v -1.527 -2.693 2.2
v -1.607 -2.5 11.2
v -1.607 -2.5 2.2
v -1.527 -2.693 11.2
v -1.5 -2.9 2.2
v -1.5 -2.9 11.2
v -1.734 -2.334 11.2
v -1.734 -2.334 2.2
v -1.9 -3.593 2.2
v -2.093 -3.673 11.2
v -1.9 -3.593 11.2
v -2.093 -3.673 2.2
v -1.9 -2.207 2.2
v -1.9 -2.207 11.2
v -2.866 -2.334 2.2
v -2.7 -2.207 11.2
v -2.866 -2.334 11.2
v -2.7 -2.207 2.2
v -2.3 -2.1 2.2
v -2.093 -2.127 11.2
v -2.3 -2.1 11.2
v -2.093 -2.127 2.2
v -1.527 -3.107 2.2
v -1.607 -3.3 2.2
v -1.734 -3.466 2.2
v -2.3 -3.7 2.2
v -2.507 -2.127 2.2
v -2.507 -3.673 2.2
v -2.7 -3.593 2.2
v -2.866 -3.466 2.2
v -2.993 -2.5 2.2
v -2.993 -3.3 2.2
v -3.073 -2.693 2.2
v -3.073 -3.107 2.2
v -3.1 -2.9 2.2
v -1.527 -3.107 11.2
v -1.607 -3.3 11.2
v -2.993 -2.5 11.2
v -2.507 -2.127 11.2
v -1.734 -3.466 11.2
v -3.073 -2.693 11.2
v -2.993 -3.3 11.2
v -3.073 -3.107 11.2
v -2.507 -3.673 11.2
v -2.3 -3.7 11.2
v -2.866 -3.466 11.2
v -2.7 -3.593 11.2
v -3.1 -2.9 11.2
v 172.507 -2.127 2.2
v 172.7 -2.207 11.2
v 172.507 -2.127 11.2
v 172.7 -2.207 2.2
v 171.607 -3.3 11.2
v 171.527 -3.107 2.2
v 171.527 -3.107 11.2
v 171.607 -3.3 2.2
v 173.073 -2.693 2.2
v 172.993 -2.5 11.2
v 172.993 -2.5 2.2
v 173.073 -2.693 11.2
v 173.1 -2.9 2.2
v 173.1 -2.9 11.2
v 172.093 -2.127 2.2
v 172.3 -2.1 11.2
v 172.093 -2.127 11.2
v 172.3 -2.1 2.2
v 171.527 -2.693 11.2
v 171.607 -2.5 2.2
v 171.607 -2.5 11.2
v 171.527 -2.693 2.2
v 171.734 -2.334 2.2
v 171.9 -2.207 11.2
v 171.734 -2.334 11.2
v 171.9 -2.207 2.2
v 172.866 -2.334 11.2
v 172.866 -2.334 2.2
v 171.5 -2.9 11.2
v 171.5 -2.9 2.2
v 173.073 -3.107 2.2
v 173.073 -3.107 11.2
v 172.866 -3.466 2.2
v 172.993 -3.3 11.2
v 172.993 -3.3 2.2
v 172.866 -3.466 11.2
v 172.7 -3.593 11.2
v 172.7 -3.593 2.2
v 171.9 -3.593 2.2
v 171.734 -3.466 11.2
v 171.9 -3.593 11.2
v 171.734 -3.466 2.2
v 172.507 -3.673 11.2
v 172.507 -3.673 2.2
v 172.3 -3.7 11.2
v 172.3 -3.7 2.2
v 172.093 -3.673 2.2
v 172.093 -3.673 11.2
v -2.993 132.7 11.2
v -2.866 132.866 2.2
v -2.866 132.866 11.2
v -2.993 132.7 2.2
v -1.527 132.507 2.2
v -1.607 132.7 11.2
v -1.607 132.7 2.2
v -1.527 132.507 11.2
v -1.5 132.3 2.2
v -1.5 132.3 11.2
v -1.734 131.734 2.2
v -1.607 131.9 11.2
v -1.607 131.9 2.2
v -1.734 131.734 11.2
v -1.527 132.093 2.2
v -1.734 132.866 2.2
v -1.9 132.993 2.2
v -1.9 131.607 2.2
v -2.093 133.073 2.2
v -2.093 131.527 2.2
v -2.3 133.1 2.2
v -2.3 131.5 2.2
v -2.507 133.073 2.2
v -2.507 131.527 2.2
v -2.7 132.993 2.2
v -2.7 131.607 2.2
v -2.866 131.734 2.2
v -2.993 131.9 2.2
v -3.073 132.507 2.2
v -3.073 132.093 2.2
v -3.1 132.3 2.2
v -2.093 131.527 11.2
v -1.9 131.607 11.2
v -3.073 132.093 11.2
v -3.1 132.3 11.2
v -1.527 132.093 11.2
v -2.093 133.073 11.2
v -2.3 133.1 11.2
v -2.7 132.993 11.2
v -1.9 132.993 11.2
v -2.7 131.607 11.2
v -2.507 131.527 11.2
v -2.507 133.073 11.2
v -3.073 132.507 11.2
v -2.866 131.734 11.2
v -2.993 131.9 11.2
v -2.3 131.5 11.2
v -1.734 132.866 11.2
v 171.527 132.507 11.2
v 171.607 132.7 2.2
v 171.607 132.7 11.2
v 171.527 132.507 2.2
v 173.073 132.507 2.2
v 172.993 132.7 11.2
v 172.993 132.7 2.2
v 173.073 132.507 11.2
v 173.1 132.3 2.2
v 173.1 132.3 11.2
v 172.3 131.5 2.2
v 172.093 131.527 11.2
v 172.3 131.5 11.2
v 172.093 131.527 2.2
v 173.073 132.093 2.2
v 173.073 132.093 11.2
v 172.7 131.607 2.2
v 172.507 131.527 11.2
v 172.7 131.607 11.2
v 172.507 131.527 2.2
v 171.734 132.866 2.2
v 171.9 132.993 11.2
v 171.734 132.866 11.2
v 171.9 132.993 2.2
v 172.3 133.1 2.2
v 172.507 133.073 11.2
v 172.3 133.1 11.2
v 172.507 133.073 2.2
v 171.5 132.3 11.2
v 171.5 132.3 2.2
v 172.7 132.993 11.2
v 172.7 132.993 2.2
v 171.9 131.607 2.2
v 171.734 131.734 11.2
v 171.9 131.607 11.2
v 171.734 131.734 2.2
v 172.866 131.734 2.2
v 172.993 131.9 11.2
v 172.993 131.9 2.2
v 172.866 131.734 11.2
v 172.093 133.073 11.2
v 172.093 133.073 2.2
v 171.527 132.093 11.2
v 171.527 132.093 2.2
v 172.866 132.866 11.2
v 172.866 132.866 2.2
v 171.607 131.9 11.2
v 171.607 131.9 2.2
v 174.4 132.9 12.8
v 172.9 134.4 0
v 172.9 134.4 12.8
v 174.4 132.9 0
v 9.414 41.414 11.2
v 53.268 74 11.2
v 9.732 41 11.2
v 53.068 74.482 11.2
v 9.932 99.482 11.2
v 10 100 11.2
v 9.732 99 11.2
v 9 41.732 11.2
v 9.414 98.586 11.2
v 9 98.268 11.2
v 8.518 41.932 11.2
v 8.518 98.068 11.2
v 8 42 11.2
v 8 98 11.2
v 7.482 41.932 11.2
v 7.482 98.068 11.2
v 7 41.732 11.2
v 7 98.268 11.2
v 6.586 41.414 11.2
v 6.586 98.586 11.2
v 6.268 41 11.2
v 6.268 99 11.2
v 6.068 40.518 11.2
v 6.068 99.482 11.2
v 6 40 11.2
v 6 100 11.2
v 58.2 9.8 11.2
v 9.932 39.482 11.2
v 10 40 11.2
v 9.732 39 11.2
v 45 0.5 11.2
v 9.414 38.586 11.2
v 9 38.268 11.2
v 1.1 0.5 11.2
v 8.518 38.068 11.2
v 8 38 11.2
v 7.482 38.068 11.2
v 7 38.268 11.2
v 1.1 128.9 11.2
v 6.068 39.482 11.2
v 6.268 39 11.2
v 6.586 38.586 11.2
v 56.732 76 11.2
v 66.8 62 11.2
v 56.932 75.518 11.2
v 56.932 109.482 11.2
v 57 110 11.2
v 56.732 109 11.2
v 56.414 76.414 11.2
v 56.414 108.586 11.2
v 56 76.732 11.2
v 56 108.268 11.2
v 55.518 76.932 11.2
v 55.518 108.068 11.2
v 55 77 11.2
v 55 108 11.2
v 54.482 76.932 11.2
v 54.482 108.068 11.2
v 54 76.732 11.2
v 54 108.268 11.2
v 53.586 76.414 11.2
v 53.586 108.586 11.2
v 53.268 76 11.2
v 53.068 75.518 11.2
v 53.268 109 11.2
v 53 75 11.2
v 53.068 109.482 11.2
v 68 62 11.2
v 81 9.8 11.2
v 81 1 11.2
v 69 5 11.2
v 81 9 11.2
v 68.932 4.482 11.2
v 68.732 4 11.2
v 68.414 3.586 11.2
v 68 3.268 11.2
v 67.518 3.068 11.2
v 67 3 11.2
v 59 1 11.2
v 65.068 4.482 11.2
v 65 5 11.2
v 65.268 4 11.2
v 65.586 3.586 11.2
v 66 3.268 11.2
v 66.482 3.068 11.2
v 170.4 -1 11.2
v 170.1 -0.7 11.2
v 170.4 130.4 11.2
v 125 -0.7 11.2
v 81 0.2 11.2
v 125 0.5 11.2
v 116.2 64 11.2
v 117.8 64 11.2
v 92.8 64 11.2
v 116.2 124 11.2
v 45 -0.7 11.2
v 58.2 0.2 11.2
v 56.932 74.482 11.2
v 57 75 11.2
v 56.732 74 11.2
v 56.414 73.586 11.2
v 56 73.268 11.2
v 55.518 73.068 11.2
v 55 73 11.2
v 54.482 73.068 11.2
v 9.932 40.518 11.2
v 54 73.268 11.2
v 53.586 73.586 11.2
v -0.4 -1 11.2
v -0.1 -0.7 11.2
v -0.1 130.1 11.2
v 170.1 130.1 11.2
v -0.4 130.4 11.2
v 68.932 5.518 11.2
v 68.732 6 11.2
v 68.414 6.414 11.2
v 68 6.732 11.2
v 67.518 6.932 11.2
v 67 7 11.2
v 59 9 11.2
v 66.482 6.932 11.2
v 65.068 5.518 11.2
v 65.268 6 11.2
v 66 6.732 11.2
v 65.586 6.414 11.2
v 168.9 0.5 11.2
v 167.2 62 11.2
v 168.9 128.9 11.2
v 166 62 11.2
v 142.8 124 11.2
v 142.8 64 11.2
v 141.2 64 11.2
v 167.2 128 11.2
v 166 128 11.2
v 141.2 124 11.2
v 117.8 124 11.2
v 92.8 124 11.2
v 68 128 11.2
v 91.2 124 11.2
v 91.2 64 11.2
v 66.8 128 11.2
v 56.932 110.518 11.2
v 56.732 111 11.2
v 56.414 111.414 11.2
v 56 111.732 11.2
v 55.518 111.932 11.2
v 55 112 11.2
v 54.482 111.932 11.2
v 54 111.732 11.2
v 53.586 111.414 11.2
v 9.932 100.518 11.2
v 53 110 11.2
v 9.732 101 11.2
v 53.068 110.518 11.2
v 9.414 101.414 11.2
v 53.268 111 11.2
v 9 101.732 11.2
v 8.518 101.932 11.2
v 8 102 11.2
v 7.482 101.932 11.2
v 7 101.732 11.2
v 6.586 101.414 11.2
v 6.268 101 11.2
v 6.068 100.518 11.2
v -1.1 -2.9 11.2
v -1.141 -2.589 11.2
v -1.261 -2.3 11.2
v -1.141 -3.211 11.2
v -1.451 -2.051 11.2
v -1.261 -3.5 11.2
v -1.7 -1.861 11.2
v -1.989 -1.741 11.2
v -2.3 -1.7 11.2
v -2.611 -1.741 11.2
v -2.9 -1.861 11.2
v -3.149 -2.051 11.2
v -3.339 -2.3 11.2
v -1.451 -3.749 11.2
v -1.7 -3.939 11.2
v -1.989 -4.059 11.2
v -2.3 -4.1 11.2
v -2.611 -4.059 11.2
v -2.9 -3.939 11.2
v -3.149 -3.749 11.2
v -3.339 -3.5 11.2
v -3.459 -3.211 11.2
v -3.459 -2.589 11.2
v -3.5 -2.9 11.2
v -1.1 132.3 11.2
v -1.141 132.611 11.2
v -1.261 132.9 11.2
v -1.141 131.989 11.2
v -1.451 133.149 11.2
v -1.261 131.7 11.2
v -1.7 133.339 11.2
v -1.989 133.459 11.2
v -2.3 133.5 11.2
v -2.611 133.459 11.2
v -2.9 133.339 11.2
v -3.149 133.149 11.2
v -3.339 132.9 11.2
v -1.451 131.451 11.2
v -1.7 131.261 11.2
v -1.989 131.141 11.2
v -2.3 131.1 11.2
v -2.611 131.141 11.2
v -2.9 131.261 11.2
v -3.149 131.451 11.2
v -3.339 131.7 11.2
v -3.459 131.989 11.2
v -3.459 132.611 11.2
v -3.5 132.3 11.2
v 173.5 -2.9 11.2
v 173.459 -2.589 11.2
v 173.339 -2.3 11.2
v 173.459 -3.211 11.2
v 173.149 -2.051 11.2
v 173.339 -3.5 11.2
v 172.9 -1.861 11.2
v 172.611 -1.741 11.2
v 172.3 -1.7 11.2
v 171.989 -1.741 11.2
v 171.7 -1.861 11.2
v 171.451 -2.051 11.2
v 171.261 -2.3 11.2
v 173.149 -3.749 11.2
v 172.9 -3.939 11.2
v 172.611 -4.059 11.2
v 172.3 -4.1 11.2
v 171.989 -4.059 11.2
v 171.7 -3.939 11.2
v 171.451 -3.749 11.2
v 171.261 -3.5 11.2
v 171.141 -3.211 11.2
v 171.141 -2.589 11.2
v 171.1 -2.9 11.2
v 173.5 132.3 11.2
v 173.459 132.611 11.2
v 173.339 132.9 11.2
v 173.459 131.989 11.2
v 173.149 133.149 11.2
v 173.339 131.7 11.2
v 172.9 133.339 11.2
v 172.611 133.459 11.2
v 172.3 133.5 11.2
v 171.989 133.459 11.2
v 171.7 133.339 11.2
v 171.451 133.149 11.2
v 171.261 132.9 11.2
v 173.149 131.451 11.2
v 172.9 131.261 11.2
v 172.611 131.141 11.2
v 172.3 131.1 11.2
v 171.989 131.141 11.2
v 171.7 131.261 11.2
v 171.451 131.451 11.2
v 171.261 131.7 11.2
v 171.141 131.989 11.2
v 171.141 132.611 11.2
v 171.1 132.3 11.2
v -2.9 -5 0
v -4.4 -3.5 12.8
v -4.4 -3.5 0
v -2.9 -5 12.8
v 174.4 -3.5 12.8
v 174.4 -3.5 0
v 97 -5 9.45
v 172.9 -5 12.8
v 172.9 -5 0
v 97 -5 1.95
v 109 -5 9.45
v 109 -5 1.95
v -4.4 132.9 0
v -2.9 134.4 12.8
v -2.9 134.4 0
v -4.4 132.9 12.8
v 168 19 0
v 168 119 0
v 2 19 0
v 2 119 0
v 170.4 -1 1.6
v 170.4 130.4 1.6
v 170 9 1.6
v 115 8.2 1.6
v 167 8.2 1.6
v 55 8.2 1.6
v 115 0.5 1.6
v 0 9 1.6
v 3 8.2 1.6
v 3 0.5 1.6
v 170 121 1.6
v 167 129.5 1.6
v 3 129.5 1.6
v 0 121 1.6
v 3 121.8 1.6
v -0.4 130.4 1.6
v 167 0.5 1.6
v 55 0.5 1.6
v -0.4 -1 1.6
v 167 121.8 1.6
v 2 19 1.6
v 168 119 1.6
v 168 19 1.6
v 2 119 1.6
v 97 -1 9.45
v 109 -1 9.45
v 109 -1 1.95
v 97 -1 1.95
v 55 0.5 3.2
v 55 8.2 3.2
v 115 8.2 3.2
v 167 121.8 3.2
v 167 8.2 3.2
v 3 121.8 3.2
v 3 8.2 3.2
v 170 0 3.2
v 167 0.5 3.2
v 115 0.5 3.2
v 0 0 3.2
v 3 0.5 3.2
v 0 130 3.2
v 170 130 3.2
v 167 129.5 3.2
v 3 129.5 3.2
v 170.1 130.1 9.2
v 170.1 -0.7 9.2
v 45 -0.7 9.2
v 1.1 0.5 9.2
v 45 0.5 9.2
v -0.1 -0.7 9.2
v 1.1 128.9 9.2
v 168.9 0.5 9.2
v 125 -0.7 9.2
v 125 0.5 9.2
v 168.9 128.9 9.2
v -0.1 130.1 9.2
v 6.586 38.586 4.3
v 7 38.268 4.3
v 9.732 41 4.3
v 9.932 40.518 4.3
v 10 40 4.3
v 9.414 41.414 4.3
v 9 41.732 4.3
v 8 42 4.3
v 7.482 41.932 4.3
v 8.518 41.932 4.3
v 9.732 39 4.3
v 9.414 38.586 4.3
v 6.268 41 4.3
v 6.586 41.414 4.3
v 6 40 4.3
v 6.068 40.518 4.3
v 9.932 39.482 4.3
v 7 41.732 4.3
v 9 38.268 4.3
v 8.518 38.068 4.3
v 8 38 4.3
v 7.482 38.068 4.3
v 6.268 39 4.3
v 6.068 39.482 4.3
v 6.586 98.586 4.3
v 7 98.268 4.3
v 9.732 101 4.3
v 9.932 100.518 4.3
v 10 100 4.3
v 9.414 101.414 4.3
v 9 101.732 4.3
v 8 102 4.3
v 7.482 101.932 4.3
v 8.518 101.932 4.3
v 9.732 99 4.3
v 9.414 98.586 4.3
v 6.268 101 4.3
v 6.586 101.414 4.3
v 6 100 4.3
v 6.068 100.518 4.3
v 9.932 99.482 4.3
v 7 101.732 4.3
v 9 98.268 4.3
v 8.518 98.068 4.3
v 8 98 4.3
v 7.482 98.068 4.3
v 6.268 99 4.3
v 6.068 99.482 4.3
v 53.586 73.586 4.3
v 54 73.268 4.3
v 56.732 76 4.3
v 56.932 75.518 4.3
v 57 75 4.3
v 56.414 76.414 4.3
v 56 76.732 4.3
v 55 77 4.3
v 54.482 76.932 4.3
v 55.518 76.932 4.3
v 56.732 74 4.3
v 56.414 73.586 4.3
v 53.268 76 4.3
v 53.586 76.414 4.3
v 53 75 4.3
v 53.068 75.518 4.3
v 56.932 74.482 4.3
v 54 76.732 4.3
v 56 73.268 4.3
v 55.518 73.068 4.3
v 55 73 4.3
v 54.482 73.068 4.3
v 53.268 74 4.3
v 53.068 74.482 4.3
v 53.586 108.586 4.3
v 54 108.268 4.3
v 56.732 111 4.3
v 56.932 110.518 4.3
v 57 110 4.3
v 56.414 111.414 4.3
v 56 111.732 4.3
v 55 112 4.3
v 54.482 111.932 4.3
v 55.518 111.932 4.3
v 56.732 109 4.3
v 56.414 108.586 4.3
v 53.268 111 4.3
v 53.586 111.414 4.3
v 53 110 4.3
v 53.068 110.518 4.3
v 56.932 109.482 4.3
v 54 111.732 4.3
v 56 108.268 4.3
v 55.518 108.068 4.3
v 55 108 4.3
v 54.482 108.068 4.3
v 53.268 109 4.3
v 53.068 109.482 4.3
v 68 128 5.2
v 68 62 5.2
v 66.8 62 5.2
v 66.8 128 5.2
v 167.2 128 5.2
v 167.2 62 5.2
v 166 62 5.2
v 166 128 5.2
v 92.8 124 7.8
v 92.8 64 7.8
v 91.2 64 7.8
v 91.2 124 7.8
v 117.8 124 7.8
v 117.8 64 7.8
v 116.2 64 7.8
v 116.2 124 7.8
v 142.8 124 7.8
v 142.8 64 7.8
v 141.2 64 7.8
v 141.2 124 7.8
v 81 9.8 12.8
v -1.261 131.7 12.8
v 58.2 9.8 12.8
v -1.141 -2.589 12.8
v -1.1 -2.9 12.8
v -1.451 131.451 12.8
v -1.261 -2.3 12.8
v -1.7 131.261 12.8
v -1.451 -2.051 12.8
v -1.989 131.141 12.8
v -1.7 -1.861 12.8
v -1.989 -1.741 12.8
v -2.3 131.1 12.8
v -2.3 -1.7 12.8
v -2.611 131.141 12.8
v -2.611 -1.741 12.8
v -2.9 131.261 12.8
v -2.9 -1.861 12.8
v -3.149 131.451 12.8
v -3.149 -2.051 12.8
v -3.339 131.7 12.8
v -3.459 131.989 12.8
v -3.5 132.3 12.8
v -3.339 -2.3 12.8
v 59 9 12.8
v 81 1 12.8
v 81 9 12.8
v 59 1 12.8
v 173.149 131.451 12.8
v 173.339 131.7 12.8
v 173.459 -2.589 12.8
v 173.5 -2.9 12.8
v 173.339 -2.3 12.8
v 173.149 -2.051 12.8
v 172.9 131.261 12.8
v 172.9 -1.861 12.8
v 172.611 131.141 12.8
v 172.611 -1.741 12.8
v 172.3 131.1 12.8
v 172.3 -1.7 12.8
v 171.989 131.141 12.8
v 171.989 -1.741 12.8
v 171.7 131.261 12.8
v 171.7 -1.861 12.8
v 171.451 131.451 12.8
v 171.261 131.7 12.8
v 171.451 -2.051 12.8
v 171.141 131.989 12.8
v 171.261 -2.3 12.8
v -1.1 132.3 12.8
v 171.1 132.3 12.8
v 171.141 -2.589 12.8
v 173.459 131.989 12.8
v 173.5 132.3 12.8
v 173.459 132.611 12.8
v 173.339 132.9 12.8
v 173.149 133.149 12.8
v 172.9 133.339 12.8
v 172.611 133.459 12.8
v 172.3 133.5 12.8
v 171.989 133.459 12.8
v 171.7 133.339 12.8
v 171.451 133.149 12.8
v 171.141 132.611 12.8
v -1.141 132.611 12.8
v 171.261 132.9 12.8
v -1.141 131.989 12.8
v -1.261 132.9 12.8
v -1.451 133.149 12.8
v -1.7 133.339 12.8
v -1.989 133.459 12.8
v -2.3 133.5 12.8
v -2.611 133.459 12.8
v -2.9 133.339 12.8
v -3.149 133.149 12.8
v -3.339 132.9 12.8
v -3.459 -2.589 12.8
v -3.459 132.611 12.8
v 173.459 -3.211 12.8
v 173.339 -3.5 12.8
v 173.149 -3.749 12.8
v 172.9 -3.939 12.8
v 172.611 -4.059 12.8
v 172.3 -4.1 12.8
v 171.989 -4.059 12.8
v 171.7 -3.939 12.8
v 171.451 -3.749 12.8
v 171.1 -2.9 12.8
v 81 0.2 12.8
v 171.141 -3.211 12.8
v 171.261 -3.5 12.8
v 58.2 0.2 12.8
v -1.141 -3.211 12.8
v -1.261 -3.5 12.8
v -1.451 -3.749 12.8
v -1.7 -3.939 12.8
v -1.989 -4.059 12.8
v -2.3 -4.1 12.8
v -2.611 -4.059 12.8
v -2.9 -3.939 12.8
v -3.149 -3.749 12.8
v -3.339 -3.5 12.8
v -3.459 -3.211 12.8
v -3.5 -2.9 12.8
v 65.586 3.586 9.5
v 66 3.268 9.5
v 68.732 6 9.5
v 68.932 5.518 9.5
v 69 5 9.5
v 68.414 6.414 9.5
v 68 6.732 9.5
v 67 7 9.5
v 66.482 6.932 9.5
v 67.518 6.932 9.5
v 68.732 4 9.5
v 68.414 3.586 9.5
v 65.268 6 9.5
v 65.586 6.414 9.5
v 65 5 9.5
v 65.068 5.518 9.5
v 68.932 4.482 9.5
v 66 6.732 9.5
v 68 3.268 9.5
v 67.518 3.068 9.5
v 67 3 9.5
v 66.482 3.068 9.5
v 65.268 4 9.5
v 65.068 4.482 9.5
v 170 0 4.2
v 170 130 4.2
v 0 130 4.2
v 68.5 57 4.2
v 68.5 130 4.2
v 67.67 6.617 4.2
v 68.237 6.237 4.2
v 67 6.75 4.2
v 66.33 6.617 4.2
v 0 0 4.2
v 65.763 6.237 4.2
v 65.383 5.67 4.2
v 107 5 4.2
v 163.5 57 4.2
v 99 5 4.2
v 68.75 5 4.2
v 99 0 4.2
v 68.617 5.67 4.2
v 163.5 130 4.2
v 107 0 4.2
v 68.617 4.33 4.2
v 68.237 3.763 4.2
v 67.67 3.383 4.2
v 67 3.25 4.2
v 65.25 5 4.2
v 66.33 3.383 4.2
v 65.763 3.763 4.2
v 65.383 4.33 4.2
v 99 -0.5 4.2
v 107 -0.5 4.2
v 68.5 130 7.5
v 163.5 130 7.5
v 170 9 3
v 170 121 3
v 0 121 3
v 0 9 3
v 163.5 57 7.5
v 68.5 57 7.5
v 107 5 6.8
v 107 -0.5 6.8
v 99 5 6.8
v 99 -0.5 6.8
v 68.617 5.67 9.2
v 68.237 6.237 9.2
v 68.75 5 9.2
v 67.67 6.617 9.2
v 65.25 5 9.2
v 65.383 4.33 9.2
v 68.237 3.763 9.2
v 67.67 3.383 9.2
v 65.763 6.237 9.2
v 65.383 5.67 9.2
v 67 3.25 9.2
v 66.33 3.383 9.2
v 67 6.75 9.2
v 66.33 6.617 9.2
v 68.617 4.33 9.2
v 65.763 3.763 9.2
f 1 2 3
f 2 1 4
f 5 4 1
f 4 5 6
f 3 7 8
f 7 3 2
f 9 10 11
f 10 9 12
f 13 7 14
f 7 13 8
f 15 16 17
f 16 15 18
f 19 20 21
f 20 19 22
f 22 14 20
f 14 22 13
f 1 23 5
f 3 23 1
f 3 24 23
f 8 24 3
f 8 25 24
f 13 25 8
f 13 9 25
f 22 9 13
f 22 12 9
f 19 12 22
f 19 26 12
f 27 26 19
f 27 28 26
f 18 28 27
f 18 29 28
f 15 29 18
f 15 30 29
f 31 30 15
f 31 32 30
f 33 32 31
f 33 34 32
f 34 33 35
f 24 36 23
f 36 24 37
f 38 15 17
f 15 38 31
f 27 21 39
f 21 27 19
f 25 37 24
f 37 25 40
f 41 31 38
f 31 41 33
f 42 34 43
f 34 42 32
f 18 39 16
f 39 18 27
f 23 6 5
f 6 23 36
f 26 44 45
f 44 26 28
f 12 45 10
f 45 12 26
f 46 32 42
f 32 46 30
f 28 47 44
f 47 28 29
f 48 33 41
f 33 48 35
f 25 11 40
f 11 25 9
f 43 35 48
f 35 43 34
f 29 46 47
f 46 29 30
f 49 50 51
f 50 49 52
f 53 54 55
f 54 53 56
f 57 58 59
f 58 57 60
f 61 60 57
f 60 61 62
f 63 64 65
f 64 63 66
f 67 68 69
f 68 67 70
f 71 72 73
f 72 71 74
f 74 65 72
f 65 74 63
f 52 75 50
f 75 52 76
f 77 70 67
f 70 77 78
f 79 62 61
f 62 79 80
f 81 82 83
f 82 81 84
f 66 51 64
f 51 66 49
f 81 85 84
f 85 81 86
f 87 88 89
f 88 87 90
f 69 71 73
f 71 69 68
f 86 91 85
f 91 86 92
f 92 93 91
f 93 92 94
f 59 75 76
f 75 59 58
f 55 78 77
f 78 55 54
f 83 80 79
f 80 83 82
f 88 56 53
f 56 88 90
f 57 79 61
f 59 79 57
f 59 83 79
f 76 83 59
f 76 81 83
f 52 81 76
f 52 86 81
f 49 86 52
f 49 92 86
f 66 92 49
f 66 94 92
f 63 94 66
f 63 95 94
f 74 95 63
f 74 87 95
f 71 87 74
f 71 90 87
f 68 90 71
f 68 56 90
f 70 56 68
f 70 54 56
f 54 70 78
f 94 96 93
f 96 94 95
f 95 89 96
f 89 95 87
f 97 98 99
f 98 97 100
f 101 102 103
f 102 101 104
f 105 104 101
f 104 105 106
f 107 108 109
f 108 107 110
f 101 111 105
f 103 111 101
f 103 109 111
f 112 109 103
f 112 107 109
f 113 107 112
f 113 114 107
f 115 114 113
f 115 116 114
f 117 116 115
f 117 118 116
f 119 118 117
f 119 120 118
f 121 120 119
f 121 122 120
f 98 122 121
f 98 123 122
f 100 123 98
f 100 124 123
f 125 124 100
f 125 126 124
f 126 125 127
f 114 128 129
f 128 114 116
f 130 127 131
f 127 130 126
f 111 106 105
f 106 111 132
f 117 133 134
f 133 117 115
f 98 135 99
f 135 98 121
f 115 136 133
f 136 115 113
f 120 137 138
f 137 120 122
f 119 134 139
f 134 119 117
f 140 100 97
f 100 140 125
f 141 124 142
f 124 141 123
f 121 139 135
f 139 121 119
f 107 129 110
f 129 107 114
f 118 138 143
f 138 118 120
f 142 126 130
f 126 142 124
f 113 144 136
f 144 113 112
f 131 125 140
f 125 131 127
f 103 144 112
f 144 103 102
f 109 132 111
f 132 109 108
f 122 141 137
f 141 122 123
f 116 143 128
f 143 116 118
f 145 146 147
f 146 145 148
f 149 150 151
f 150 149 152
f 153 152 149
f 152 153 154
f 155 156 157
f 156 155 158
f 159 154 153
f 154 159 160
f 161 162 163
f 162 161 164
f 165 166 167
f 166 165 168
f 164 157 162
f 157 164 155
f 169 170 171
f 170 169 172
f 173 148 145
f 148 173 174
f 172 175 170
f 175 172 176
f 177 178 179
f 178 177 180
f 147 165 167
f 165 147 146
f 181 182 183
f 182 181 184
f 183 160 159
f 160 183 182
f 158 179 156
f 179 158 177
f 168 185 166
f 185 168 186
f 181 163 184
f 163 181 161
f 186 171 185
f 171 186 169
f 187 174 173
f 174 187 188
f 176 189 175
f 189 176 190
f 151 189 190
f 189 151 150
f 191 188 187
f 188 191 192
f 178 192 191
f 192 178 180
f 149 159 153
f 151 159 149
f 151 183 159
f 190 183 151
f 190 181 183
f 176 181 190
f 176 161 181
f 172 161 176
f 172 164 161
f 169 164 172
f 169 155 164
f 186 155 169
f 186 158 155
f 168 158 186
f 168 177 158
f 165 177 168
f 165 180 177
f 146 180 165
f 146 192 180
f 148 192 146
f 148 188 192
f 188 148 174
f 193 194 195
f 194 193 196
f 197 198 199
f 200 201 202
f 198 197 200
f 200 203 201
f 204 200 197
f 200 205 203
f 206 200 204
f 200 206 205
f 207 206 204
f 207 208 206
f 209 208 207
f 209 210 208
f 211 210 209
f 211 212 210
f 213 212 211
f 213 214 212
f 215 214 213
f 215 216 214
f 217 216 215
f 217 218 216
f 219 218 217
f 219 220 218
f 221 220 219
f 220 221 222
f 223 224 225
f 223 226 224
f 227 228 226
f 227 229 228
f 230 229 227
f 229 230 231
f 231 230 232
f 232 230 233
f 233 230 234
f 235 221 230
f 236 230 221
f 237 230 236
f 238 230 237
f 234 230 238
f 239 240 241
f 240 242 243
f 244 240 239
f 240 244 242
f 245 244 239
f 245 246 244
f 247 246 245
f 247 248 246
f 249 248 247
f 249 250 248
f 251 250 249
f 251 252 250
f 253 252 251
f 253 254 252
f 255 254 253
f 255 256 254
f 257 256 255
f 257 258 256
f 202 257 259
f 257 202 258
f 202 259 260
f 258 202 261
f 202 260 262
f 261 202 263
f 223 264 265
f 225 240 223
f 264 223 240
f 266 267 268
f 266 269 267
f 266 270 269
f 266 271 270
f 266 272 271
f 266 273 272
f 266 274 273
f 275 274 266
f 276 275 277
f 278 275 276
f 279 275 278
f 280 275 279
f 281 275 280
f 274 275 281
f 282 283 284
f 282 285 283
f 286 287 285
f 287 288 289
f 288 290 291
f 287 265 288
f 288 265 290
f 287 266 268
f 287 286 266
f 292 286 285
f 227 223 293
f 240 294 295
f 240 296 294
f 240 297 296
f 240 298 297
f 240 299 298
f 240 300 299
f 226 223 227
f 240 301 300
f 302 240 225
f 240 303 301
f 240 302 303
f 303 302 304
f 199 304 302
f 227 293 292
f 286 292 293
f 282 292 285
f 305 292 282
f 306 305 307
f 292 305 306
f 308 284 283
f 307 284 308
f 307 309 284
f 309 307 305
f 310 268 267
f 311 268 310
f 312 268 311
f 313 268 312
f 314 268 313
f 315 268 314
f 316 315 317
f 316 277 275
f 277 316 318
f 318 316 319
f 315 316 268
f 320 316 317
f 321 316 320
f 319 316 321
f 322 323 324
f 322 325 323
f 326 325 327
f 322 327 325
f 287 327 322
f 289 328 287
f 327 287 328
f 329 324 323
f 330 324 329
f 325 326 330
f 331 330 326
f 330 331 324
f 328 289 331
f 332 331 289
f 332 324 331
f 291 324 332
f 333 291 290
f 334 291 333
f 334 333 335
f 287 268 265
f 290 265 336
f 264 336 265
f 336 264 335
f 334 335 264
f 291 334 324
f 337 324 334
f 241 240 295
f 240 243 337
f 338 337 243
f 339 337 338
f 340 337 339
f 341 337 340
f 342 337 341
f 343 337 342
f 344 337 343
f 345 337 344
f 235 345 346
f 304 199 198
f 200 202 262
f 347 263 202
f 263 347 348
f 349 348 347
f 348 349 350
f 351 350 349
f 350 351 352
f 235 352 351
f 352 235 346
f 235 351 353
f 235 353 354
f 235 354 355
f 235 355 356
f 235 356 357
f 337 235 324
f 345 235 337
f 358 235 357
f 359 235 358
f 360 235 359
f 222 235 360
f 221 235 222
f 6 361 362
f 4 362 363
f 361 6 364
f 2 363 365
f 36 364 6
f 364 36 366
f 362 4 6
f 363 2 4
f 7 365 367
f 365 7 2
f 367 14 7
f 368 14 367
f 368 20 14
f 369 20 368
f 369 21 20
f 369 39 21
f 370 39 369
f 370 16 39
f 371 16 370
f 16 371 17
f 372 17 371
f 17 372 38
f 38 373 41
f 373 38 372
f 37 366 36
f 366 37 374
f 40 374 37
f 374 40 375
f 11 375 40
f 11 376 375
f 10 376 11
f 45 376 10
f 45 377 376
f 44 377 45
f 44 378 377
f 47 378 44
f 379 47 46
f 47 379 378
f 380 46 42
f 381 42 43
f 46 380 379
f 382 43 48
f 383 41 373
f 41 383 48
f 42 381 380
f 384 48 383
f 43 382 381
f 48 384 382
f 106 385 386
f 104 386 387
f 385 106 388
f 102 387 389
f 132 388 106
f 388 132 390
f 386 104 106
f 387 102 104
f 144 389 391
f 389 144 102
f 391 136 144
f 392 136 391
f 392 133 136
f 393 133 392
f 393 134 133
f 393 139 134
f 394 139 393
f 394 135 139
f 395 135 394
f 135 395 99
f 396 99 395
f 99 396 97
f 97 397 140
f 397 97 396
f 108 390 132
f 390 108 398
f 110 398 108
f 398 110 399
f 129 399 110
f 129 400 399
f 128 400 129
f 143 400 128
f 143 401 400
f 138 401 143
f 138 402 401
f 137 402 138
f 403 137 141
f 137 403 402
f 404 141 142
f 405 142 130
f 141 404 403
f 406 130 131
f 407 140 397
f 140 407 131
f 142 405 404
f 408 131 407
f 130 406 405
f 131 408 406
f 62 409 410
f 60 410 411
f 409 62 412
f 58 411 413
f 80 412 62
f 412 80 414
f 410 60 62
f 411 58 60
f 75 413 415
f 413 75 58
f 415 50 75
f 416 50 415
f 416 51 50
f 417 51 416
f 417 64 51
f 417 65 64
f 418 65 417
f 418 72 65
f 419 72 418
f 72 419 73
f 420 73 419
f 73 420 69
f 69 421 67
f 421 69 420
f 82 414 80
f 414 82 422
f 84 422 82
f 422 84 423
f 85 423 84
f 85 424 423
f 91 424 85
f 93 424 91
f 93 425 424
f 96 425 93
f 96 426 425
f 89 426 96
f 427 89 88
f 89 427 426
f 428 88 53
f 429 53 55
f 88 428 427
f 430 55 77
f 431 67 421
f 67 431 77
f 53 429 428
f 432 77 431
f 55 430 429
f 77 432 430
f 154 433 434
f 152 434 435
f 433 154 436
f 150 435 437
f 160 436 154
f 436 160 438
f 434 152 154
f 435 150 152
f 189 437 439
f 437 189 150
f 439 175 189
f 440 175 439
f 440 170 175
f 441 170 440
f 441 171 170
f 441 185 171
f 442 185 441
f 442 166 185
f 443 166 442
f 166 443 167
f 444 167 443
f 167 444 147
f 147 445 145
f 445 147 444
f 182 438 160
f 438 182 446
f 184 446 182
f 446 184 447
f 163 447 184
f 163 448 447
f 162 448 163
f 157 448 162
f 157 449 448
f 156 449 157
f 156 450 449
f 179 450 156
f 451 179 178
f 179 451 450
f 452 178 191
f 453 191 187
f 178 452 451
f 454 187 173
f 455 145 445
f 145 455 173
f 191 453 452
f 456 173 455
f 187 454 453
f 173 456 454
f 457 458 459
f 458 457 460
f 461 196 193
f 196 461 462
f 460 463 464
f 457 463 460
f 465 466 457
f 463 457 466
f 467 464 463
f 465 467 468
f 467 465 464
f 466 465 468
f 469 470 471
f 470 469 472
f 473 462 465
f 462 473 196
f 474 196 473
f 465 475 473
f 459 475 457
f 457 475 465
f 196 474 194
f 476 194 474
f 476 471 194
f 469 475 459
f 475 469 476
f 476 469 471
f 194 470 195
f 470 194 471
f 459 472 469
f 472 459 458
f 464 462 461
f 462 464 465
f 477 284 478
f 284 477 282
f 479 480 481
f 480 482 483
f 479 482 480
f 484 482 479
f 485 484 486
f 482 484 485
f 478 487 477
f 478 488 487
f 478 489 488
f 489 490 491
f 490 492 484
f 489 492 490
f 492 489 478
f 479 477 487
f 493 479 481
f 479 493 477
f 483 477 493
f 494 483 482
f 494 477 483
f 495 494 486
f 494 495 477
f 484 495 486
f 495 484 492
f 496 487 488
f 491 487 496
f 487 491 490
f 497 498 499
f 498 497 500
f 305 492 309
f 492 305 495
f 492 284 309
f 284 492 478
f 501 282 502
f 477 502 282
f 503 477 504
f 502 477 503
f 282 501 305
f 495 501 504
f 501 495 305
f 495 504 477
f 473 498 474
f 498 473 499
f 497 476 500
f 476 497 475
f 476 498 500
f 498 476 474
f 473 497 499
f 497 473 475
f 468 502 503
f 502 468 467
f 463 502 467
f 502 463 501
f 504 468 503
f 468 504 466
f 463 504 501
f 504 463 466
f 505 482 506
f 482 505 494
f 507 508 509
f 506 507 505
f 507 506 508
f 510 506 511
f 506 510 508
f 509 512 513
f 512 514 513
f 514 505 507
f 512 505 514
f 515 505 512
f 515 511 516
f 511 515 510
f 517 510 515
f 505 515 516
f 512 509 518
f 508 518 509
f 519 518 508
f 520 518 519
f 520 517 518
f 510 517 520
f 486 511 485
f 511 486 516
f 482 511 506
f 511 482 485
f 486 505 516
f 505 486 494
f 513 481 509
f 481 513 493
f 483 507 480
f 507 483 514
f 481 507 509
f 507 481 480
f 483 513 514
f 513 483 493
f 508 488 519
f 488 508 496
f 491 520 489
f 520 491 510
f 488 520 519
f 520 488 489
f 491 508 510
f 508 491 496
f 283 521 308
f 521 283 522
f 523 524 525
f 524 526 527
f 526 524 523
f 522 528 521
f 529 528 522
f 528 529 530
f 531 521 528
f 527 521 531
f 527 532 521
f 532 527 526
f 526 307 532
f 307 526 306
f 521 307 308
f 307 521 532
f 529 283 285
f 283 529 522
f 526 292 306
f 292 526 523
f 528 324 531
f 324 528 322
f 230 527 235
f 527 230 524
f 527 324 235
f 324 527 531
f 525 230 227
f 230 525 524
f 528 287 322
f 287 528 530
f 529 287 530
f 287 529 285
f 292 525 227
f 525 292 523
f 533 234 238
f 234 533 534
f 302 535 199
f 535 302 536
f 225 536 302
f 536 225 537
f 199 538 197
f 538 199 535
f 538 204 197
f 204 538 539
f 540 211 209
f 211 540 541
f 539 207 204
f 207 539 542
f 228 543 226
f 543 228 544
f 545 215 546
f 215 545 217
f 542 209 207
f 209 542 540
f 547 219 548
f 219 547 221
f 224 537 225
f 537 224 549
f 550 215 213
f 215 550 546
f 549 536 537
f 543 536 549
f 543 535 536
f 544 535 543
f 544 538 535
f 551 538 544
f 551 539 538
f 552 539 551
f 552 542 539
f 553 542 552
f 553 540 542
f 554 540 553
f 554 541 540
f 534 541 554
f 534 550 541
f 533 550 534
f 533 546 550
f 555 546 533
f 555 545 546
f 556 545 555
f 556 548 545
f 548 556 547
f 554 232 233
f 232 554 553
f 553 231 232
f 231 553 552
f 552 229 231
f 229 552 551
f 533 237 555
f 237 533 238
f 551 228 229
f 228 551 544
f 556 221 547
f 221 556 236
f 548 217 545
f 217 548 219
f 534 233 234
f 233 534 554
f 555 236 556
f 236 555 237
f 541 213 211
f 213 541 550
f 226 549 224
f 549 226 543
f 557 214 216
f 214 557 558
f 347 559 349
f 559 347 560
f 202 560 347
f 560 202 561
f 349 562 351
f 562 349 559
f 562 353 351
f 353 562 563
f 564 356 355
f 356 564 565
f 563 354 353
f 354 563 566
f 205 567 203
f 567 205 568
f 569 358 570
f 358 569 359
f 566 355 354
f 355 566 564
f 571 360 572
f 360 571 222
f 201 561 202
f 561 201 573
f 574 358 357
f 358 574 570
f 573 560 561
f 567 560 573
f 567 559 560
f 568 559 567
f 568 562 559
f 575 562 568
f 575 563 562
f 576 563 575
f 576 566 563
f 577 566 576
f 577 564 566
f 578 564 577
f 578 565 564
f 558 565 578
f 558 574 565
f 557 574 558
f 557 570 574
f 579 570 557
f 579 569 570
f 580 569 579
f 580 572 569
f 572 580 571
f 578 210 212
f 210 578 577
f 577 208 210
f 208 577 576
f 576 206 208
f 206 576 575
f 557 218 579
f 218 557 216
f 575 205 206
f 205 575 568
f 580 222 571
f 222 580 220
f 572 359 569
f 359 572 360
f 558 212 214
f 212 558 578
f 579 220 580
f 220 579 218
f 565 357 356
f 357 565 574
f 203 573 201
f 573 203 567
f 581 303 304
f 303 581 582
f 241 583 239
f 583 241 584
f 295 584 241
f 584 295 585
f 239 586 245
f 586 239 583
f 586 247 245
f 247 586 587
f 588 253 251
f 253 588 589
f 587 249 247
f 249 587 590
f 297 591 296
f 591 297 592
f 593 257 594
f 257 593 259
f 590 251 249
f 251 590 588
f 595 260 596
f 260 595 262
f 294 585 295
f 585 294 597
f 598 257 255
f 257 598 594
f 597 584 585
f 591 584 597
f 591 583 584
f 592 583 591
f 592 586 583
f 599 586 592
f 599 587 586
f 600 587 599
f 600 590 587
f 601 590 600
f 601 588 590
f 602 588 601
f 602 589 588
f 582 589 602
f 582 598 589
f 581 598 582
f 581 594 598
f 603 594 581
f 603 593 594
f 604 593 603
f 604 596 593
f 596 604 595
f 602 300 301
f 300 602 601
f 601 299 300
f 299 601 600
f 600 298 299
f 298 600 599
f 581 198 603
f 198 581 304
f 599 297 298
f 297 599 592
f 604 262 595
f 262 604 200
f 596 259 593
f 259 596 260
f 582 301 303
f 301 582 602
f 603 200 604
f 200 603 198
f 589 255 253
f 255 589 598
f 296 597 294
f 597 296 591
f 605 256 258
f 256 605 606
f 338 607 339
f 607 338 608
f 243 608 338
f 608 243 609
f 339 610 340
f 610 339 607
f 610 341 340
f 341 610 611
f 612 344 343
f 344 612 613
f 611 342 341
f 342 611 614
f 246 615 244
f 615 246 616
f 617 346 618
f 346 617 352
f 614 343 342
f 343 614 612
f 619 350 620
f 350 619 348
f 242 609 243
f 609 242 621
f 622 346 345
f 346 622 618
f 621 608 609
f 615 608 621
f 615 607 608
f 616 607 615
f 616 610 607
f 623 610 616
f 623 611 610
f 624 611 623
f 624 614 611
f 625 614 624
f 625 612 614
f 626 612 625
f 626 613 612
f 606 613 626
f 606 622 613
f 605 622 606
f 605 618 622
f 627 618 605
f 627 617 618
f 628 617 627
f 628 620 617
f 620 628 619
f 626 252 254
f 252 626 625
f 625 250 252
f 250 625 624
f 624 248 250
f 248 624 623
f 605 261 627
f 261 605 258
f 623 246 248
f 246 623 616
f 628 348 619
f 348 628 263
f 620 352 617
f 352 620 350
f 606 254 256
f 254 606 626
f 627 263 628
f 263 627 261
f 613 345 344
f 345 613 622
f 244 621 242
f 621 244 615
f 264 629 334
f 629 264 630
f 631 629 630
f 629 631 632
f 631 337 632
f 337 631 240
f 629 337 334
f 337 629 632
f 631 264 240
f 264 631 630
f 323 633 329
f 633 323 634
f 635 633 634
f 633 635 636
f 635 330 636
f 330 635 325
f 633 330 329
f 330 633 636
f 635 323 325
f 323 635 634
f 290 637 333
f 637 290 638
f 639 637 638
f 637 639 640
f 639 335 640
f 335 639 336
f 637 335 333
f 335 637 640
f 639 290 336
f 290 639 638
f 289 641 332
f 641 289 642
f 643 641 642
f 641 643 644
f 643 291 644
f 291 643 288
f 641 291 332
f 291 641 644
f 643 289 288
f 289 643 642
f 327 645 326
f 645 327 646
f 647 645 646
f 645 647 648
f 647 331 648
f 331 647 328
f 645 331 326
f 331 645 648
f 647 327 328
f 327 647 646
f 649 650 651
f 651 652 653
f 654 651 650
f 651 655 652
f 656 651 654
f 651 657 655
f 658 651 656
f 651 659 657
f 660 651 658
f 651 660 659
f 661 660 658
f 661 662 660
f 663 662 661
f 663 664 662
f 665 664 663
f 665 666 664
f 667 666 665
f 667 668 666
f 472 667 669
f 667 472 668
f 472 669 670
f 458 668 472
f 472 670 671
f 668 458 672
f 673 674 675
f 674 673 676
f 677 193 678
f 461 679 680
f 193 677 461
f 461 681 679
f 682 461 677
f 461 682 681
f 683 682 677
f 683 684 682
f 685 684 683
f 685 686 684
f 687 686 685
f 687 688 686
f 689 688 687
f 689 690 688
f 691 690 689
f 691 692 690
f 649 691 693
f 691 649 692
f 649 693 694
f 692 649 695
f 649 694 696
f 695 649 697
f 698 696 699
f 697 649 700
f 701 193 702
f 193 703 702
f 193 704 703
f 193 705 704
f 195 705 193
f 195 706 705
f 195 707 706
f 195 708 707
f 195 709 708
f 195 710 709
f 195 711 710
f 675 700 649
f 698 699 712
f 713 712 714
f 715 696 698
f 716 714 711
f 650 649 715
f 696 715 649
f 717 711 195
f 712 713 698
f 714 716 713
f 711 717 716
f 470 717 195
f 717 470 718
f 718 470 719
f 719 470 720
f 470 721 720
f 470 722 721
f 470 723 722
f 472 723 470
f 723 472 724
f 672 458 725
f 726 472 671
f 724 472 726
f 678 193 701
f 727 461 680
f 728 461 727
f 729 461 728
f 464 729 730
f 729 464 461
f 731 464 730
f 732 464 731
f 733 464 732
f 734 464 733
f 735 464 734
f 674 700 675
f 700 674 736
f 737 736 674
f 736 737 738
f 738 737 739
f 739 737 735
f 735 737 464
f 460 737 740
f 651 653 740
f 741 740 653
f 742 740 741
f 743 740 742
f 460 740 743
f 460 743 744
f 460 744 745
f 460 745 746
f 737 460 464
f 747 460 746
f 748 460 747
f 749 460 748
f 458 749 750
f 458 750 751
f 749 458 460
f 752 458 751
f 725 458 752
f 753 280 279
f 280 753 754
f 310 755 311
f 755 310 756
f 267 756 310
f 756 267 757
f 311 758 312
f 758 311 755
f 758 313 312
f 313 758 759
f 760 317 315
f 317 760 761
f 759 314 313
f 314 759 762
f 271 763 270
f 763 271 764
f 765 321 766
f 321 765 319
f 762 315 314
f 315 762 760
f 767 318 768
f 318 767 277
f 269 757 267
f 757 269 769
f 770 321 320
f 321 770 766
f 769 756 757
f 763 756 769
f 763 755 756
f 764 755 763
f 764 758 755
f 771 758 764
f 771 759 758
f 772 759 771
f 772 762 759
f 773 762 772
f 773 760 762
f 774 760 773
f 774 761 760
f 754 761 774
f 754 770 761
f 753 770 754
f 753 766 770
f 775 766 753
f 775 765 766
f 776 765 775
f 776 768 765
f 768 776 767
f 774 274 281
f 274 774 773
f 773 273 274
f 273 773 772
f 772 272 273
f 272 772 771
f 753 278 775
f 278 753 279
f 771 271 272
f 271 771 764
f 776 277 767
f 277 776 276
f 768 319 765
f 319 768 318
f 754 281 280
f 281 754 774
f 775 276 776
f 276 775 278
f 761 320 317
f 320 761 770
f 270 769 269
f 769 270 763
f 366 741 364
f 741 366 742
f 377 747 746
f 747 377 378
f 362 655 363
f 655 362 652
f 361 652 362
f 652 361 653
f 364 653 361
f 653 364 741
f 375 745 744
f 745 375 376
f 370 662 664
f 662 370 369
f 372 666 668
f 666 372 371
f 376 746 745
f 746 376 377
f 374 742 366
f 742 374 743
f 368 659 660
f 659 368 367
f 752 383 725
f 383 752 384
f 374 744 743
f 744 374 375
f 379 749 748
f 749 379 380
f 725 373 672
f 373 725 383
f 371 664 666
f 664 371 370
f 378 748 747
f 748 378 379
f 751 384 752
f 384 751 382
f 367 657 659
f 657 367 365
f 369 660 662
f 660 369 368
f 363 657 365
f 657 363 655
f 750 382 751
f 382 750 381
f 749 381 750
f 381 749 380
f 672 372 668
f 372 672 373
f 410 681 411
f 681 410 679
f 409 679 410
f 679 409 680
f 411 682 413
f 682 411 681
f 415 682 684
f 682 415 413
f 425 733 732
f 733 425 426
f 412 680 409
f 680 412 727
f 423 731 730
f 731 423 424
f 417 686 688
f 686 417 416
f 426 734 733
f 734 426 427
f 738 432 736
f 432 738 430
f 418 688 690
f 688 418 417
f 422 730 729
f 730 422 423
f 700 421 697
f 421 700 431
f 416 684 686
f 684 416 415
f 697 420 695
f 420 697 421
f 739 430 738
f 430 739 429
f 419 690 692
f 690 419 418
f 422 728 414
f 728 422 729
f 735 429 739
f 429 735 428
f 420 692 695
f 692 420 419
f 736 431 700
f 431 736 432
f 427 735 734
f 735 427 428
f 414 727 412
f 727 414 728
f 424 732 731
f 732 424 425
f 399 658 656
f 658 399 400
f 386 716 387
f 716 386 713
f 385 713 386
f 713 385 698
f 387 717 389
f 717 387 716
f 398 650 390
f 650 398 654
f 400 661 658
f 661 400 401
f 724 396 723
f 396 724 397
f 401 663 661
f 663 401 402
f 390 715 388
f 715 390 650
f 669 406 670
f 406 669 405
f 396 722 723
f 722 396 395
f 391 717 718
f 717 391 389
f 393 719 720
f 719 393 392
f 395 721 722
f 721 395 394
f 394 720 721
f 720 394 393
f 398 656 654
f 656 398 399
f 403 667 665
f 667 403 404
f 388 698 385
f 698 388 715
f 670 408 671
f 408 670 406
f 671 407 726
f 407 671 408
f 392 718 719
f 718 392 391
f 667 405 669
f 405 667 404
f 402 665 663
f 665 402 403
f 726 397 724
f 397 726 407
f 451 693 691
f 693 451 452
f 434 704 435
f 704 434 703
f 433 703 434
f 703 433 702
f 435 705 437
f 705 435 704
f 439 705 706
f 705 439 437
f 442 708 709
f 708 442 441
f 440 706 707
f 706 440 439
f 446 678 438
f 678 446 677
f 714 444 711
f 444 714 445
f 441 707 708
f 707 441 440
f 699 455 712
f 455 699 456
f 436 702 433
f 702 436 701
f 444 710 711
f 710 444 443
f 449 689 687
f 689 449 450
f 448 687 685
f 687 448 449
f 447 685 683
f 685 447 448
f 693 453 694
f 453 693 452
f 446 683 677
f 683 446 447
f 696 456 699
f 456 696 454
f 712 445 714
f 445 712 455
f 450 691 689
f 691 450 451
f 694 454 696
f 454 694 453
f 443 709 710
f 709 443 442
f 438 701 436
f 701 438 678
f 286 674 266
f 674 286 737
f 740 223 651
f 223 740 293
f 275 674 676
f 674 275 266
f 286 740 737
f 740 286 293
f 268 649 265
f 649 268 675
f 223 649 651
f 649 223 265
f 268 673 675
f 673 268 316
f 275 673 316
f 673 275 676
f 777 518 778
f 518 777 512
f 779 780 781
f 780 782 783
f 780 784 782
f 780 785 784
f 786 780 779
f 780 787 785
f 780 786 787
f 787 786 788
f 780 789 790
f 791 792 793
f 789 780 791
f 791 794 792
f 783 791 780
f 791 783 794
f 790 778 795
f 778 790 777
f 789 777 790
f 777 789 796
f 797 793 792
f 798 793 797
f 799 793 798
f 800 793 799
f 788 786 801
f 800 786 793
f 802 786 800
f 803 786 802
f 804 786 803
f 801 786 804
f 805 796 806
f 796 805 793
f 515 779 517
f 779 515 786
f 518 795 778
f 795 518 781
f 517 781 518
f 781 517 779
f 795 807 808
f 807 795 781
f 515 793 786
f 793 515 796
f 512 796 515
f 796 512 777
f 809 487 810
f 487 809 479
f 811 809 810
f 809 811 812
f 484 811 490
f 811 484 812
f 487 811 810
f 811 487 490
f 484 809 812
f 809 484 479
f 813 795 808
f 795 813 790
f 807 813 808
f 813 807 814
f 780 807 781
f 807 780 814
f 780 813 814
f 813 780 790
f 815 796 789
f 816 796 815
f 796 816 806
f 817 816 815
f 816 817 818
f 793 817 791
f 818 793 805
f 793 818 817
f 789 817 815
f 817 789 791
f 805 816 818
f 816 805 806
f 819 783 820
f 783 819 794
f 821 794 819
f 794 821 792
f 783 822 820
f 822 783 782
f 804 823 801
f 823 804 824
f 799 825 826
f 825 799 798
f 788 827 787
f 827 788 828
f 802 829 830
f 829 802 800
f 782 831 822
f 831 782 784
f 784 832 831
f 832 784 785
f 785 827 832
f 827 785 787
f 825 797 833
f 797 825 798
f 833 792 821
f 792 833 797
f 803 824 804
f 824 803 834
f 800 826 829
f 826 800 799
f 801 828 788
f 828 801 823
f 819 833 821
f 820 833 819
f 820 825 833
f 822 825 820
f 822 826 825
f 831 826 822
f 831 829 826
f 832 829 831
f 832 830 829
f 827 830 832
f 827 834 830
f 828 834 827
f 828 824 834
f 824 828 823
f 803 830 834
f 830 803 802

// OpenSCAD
// AviorSign case: ESP32-M075 V3.0 board, GDEM075F53 display, Vixion 357590 battery.
// Sizes measured by the owner on 2026-10-22; assumed values are marked.
//
// Coordinates: front view (as seen from the street through the glass), origin at the
// bottom-left corner of the board, x to the right, y up, z from the glass (0) into the room.
// The display FPC and the board's USB and button are on the bottom edge.
//
// Two parts, M2 self-tapping screws in the four corners:
//   part="front": frame + walls, printed glossy face down on the smooth plate, glued to the glass;
//   part="back":  cover with the battery bay and the button key, printed outer face down.

part = "assembly"; // front | back | assembly

// --- measured
board_w = 170; board_h = 130; board_t = 1.0;
disp_h = 112; disp_t = 1.4; disp_y = 9;          // flush with the board sides, 9 mm above and below
view_side = 2; view_top = 2; view_bottom = 10;   // glass edge to picture; the FPC side is wider
comp_h = 6.0;                                    // tallest part on the back (battery connector)
bat_w = 95; bat_h = 73; bat_t = 3.3;
usb_x = 103;                                     // micro-USB centre (67 mm from the left seen from the back)
btn_x = 67; btn_y = 5;                           // board button centre
// --- assumed: check before printing
tape_t = 0.2;        // double-sided tape between display and board
usb_up = 1.5;        // micro-USB centre above the board
btn_h = 5.0;         // button height above the board (the key works for 3.5 to 5 mm)
// --- case
front_t = 1.6; back_t = 1.6; wall = 4.0; gap = 0.4; gap_bottom = 1.0; clear = comp_h + 1;
pilot = 1.6; screw_hole = 2.4; pilot_in = 1.9;   // screw axes 1.9 mm diagonally outside the cavity corners

z_board = front_t + disp_t + tape_t;             // front face of the board
z_back = z_board + board_t;                      // back face of the board (components)
z_in = z_back + clear;                           // inside face of the cover
cav = [-gap, -gap_bottom, board_w + gap, board_h + gap];
out = [cav[0] - wall, cav[1] - wall, cav[2] + wall, cav[3] + wall];
screws = [[cav[0] - pilot_in, cav[1] - pilot_in], [cav[2] + pilot_in, cav[1] - pilot_in],
          [cav[0] - pilot_in, cav[3] + pilot_in], [cav[2] + pilot_in, cav[3] + pilot_in]];
win = [view_side, disp_y + view_bottom, board_w - view_side, disp_y + disp_h - view_top];

module box(x0, y0, x1, y1, z0, z1) translate([x0, y0, z0]) cube([x1 - x0, y1 - y0, z1 - z0]);
module rounded(r, z0, z1)
  translate([0, 0, z0]) linear_extrude(z1 - z0) offset(r) offset(-r)
    translate([out[0], out[1]]) square([out[2] - out[0], out[3] - out[1]]);

module front() {
  difference() {
    rounded(1.5, 0, z_in);
    box(cav[0], cav[1], cav[2], cav[3], front_t, z_in + 1);
    box(win[0], win[1], win[2], win[3], -1, front_t + 1);                    // display window
    for (s = screws) translate([s[0], s[1], z_in - 9]) cylinder(d = pilot, h = 10, $fn = 24);
    box(usb_x - 6, out[1] - 1, usb_x + 6, cav[1] + 1, z_back + usb_up - 3.75, z_back + usb_up + 3.75); // USB plug
  }
  // The board rests on these strips along its margins (no display there); the FPC passes in the middle below.
  box(3, disp_y + disp_h + 0.8, board_w - 3, board_h - 0.5, front_t - 0.01, z_board);
  for (x = [[3, 55], [115, board_w - 3]]) box(x[0], 0.5, x[1], disp_y - 0.8, front_t - 0.01, z_board);
}

module back() {
  lip_t = 1.2; lip_off = 0.3; lip_d = 2.0;
  key = [59, 1, 81, 9];                     // flexible key over the button, hinge on the right
  difference() {
    union() {
      rounded(1.5, z_in, z_in + back_t);
      // Locating lip inside the walls, open along the bottom middle (FPC, button, USB).
      difference() {
        box(cav[0] + lip_off, cav[1] + lip_off, cav[2] - lip_off, cav[3] - lip_off, z_in - lip_d, z_in + 0.01);
        box(cav[0] + lip_off + lip_t, cav[1] + lip_off + lip_t, cav[2] - lip_off - lip_t, cav[3] - lip_off - lip_t, z_in - lip_d - 1, z_in + 1);
        box(45, cav[1] - 1, 125, cav[1] + 5, z_in - lip_d - 1, z_in + 1);
      }
      // Posts pressing the board onto the front strips, where the back of the board is empty.
      for (p = [[8, 40], [8, 100], [55, 75], [55, 110]]) translate([p[0], p[1], z_back + 0.1]) cylinder(d = 4, h = z_in - z_back, $fn = 24);
      // Battery bay: side walls and three ribs holding it down; open at the bottom for the wires.
      for (x = [66.8, 166]) box(x, 62, x + 1.2, 128, z_back + 1, z_in + 0.01);
      for (x = [92, 117, 142]) box(x - 0.8, 64, x + 0.8, 124, z_back + bat_t + 0.3, z_in + 0.01);
      // Key post over the button.
      translate([btn_x, btn_y, z_back + btn_h + 0.3]) cylinder(d = 4, h = z_in - z_back - btn_h, $fn = 24);
    }
    for (s = screws) translate([s[0], s[1], z_in - 1]) cylinder(d = screw_hole, h = back_t + 2, $fn = 24);
    // U-shaped slot around the key.
    for (b = [[key[0] - 0.8, key[1] - 0.8, key[2], key[1]], [key[0] - 0.8, key[3], key[2], key[3] + 0.8], [key[0] - 0.8, key[1] - 0.8, key[0], key[3] + 0.8]])
      box(b[0], b[1], b[2], b[3], z_in - 1, z_in + back_t + 1);
  }
}

module board_and_display() {
  color("royalblue") box(0, 0, board_w, board_h, z_board, z_back);
  color("whitesmoke") box(0, disp_y, board_w, disp_y + disp_h, front_t, front_t + disp_t);
  color("gold") box(68.5, 57, 68.5 + bat_w, 57 + bat_h, z_back, z_back + bat_t);
  color("silver") box(usb_x - 4, -0.5, usb_x + 4, 5, z_back, z_back + 2.6);
  color("red") translate([btn_x, btn_y, z_back]) cylinder(d = 3.5, h = btn_h, $fn = 16);
}

if (part == "front") front();
else if (part == "back") translate([0, 0, z_in + back_t]) rotate([180, 0, 0]) back();   // outer face down
else { color("white", 0.9) front(); color("lightgray", 0.6) back(); board_and_display(); }
